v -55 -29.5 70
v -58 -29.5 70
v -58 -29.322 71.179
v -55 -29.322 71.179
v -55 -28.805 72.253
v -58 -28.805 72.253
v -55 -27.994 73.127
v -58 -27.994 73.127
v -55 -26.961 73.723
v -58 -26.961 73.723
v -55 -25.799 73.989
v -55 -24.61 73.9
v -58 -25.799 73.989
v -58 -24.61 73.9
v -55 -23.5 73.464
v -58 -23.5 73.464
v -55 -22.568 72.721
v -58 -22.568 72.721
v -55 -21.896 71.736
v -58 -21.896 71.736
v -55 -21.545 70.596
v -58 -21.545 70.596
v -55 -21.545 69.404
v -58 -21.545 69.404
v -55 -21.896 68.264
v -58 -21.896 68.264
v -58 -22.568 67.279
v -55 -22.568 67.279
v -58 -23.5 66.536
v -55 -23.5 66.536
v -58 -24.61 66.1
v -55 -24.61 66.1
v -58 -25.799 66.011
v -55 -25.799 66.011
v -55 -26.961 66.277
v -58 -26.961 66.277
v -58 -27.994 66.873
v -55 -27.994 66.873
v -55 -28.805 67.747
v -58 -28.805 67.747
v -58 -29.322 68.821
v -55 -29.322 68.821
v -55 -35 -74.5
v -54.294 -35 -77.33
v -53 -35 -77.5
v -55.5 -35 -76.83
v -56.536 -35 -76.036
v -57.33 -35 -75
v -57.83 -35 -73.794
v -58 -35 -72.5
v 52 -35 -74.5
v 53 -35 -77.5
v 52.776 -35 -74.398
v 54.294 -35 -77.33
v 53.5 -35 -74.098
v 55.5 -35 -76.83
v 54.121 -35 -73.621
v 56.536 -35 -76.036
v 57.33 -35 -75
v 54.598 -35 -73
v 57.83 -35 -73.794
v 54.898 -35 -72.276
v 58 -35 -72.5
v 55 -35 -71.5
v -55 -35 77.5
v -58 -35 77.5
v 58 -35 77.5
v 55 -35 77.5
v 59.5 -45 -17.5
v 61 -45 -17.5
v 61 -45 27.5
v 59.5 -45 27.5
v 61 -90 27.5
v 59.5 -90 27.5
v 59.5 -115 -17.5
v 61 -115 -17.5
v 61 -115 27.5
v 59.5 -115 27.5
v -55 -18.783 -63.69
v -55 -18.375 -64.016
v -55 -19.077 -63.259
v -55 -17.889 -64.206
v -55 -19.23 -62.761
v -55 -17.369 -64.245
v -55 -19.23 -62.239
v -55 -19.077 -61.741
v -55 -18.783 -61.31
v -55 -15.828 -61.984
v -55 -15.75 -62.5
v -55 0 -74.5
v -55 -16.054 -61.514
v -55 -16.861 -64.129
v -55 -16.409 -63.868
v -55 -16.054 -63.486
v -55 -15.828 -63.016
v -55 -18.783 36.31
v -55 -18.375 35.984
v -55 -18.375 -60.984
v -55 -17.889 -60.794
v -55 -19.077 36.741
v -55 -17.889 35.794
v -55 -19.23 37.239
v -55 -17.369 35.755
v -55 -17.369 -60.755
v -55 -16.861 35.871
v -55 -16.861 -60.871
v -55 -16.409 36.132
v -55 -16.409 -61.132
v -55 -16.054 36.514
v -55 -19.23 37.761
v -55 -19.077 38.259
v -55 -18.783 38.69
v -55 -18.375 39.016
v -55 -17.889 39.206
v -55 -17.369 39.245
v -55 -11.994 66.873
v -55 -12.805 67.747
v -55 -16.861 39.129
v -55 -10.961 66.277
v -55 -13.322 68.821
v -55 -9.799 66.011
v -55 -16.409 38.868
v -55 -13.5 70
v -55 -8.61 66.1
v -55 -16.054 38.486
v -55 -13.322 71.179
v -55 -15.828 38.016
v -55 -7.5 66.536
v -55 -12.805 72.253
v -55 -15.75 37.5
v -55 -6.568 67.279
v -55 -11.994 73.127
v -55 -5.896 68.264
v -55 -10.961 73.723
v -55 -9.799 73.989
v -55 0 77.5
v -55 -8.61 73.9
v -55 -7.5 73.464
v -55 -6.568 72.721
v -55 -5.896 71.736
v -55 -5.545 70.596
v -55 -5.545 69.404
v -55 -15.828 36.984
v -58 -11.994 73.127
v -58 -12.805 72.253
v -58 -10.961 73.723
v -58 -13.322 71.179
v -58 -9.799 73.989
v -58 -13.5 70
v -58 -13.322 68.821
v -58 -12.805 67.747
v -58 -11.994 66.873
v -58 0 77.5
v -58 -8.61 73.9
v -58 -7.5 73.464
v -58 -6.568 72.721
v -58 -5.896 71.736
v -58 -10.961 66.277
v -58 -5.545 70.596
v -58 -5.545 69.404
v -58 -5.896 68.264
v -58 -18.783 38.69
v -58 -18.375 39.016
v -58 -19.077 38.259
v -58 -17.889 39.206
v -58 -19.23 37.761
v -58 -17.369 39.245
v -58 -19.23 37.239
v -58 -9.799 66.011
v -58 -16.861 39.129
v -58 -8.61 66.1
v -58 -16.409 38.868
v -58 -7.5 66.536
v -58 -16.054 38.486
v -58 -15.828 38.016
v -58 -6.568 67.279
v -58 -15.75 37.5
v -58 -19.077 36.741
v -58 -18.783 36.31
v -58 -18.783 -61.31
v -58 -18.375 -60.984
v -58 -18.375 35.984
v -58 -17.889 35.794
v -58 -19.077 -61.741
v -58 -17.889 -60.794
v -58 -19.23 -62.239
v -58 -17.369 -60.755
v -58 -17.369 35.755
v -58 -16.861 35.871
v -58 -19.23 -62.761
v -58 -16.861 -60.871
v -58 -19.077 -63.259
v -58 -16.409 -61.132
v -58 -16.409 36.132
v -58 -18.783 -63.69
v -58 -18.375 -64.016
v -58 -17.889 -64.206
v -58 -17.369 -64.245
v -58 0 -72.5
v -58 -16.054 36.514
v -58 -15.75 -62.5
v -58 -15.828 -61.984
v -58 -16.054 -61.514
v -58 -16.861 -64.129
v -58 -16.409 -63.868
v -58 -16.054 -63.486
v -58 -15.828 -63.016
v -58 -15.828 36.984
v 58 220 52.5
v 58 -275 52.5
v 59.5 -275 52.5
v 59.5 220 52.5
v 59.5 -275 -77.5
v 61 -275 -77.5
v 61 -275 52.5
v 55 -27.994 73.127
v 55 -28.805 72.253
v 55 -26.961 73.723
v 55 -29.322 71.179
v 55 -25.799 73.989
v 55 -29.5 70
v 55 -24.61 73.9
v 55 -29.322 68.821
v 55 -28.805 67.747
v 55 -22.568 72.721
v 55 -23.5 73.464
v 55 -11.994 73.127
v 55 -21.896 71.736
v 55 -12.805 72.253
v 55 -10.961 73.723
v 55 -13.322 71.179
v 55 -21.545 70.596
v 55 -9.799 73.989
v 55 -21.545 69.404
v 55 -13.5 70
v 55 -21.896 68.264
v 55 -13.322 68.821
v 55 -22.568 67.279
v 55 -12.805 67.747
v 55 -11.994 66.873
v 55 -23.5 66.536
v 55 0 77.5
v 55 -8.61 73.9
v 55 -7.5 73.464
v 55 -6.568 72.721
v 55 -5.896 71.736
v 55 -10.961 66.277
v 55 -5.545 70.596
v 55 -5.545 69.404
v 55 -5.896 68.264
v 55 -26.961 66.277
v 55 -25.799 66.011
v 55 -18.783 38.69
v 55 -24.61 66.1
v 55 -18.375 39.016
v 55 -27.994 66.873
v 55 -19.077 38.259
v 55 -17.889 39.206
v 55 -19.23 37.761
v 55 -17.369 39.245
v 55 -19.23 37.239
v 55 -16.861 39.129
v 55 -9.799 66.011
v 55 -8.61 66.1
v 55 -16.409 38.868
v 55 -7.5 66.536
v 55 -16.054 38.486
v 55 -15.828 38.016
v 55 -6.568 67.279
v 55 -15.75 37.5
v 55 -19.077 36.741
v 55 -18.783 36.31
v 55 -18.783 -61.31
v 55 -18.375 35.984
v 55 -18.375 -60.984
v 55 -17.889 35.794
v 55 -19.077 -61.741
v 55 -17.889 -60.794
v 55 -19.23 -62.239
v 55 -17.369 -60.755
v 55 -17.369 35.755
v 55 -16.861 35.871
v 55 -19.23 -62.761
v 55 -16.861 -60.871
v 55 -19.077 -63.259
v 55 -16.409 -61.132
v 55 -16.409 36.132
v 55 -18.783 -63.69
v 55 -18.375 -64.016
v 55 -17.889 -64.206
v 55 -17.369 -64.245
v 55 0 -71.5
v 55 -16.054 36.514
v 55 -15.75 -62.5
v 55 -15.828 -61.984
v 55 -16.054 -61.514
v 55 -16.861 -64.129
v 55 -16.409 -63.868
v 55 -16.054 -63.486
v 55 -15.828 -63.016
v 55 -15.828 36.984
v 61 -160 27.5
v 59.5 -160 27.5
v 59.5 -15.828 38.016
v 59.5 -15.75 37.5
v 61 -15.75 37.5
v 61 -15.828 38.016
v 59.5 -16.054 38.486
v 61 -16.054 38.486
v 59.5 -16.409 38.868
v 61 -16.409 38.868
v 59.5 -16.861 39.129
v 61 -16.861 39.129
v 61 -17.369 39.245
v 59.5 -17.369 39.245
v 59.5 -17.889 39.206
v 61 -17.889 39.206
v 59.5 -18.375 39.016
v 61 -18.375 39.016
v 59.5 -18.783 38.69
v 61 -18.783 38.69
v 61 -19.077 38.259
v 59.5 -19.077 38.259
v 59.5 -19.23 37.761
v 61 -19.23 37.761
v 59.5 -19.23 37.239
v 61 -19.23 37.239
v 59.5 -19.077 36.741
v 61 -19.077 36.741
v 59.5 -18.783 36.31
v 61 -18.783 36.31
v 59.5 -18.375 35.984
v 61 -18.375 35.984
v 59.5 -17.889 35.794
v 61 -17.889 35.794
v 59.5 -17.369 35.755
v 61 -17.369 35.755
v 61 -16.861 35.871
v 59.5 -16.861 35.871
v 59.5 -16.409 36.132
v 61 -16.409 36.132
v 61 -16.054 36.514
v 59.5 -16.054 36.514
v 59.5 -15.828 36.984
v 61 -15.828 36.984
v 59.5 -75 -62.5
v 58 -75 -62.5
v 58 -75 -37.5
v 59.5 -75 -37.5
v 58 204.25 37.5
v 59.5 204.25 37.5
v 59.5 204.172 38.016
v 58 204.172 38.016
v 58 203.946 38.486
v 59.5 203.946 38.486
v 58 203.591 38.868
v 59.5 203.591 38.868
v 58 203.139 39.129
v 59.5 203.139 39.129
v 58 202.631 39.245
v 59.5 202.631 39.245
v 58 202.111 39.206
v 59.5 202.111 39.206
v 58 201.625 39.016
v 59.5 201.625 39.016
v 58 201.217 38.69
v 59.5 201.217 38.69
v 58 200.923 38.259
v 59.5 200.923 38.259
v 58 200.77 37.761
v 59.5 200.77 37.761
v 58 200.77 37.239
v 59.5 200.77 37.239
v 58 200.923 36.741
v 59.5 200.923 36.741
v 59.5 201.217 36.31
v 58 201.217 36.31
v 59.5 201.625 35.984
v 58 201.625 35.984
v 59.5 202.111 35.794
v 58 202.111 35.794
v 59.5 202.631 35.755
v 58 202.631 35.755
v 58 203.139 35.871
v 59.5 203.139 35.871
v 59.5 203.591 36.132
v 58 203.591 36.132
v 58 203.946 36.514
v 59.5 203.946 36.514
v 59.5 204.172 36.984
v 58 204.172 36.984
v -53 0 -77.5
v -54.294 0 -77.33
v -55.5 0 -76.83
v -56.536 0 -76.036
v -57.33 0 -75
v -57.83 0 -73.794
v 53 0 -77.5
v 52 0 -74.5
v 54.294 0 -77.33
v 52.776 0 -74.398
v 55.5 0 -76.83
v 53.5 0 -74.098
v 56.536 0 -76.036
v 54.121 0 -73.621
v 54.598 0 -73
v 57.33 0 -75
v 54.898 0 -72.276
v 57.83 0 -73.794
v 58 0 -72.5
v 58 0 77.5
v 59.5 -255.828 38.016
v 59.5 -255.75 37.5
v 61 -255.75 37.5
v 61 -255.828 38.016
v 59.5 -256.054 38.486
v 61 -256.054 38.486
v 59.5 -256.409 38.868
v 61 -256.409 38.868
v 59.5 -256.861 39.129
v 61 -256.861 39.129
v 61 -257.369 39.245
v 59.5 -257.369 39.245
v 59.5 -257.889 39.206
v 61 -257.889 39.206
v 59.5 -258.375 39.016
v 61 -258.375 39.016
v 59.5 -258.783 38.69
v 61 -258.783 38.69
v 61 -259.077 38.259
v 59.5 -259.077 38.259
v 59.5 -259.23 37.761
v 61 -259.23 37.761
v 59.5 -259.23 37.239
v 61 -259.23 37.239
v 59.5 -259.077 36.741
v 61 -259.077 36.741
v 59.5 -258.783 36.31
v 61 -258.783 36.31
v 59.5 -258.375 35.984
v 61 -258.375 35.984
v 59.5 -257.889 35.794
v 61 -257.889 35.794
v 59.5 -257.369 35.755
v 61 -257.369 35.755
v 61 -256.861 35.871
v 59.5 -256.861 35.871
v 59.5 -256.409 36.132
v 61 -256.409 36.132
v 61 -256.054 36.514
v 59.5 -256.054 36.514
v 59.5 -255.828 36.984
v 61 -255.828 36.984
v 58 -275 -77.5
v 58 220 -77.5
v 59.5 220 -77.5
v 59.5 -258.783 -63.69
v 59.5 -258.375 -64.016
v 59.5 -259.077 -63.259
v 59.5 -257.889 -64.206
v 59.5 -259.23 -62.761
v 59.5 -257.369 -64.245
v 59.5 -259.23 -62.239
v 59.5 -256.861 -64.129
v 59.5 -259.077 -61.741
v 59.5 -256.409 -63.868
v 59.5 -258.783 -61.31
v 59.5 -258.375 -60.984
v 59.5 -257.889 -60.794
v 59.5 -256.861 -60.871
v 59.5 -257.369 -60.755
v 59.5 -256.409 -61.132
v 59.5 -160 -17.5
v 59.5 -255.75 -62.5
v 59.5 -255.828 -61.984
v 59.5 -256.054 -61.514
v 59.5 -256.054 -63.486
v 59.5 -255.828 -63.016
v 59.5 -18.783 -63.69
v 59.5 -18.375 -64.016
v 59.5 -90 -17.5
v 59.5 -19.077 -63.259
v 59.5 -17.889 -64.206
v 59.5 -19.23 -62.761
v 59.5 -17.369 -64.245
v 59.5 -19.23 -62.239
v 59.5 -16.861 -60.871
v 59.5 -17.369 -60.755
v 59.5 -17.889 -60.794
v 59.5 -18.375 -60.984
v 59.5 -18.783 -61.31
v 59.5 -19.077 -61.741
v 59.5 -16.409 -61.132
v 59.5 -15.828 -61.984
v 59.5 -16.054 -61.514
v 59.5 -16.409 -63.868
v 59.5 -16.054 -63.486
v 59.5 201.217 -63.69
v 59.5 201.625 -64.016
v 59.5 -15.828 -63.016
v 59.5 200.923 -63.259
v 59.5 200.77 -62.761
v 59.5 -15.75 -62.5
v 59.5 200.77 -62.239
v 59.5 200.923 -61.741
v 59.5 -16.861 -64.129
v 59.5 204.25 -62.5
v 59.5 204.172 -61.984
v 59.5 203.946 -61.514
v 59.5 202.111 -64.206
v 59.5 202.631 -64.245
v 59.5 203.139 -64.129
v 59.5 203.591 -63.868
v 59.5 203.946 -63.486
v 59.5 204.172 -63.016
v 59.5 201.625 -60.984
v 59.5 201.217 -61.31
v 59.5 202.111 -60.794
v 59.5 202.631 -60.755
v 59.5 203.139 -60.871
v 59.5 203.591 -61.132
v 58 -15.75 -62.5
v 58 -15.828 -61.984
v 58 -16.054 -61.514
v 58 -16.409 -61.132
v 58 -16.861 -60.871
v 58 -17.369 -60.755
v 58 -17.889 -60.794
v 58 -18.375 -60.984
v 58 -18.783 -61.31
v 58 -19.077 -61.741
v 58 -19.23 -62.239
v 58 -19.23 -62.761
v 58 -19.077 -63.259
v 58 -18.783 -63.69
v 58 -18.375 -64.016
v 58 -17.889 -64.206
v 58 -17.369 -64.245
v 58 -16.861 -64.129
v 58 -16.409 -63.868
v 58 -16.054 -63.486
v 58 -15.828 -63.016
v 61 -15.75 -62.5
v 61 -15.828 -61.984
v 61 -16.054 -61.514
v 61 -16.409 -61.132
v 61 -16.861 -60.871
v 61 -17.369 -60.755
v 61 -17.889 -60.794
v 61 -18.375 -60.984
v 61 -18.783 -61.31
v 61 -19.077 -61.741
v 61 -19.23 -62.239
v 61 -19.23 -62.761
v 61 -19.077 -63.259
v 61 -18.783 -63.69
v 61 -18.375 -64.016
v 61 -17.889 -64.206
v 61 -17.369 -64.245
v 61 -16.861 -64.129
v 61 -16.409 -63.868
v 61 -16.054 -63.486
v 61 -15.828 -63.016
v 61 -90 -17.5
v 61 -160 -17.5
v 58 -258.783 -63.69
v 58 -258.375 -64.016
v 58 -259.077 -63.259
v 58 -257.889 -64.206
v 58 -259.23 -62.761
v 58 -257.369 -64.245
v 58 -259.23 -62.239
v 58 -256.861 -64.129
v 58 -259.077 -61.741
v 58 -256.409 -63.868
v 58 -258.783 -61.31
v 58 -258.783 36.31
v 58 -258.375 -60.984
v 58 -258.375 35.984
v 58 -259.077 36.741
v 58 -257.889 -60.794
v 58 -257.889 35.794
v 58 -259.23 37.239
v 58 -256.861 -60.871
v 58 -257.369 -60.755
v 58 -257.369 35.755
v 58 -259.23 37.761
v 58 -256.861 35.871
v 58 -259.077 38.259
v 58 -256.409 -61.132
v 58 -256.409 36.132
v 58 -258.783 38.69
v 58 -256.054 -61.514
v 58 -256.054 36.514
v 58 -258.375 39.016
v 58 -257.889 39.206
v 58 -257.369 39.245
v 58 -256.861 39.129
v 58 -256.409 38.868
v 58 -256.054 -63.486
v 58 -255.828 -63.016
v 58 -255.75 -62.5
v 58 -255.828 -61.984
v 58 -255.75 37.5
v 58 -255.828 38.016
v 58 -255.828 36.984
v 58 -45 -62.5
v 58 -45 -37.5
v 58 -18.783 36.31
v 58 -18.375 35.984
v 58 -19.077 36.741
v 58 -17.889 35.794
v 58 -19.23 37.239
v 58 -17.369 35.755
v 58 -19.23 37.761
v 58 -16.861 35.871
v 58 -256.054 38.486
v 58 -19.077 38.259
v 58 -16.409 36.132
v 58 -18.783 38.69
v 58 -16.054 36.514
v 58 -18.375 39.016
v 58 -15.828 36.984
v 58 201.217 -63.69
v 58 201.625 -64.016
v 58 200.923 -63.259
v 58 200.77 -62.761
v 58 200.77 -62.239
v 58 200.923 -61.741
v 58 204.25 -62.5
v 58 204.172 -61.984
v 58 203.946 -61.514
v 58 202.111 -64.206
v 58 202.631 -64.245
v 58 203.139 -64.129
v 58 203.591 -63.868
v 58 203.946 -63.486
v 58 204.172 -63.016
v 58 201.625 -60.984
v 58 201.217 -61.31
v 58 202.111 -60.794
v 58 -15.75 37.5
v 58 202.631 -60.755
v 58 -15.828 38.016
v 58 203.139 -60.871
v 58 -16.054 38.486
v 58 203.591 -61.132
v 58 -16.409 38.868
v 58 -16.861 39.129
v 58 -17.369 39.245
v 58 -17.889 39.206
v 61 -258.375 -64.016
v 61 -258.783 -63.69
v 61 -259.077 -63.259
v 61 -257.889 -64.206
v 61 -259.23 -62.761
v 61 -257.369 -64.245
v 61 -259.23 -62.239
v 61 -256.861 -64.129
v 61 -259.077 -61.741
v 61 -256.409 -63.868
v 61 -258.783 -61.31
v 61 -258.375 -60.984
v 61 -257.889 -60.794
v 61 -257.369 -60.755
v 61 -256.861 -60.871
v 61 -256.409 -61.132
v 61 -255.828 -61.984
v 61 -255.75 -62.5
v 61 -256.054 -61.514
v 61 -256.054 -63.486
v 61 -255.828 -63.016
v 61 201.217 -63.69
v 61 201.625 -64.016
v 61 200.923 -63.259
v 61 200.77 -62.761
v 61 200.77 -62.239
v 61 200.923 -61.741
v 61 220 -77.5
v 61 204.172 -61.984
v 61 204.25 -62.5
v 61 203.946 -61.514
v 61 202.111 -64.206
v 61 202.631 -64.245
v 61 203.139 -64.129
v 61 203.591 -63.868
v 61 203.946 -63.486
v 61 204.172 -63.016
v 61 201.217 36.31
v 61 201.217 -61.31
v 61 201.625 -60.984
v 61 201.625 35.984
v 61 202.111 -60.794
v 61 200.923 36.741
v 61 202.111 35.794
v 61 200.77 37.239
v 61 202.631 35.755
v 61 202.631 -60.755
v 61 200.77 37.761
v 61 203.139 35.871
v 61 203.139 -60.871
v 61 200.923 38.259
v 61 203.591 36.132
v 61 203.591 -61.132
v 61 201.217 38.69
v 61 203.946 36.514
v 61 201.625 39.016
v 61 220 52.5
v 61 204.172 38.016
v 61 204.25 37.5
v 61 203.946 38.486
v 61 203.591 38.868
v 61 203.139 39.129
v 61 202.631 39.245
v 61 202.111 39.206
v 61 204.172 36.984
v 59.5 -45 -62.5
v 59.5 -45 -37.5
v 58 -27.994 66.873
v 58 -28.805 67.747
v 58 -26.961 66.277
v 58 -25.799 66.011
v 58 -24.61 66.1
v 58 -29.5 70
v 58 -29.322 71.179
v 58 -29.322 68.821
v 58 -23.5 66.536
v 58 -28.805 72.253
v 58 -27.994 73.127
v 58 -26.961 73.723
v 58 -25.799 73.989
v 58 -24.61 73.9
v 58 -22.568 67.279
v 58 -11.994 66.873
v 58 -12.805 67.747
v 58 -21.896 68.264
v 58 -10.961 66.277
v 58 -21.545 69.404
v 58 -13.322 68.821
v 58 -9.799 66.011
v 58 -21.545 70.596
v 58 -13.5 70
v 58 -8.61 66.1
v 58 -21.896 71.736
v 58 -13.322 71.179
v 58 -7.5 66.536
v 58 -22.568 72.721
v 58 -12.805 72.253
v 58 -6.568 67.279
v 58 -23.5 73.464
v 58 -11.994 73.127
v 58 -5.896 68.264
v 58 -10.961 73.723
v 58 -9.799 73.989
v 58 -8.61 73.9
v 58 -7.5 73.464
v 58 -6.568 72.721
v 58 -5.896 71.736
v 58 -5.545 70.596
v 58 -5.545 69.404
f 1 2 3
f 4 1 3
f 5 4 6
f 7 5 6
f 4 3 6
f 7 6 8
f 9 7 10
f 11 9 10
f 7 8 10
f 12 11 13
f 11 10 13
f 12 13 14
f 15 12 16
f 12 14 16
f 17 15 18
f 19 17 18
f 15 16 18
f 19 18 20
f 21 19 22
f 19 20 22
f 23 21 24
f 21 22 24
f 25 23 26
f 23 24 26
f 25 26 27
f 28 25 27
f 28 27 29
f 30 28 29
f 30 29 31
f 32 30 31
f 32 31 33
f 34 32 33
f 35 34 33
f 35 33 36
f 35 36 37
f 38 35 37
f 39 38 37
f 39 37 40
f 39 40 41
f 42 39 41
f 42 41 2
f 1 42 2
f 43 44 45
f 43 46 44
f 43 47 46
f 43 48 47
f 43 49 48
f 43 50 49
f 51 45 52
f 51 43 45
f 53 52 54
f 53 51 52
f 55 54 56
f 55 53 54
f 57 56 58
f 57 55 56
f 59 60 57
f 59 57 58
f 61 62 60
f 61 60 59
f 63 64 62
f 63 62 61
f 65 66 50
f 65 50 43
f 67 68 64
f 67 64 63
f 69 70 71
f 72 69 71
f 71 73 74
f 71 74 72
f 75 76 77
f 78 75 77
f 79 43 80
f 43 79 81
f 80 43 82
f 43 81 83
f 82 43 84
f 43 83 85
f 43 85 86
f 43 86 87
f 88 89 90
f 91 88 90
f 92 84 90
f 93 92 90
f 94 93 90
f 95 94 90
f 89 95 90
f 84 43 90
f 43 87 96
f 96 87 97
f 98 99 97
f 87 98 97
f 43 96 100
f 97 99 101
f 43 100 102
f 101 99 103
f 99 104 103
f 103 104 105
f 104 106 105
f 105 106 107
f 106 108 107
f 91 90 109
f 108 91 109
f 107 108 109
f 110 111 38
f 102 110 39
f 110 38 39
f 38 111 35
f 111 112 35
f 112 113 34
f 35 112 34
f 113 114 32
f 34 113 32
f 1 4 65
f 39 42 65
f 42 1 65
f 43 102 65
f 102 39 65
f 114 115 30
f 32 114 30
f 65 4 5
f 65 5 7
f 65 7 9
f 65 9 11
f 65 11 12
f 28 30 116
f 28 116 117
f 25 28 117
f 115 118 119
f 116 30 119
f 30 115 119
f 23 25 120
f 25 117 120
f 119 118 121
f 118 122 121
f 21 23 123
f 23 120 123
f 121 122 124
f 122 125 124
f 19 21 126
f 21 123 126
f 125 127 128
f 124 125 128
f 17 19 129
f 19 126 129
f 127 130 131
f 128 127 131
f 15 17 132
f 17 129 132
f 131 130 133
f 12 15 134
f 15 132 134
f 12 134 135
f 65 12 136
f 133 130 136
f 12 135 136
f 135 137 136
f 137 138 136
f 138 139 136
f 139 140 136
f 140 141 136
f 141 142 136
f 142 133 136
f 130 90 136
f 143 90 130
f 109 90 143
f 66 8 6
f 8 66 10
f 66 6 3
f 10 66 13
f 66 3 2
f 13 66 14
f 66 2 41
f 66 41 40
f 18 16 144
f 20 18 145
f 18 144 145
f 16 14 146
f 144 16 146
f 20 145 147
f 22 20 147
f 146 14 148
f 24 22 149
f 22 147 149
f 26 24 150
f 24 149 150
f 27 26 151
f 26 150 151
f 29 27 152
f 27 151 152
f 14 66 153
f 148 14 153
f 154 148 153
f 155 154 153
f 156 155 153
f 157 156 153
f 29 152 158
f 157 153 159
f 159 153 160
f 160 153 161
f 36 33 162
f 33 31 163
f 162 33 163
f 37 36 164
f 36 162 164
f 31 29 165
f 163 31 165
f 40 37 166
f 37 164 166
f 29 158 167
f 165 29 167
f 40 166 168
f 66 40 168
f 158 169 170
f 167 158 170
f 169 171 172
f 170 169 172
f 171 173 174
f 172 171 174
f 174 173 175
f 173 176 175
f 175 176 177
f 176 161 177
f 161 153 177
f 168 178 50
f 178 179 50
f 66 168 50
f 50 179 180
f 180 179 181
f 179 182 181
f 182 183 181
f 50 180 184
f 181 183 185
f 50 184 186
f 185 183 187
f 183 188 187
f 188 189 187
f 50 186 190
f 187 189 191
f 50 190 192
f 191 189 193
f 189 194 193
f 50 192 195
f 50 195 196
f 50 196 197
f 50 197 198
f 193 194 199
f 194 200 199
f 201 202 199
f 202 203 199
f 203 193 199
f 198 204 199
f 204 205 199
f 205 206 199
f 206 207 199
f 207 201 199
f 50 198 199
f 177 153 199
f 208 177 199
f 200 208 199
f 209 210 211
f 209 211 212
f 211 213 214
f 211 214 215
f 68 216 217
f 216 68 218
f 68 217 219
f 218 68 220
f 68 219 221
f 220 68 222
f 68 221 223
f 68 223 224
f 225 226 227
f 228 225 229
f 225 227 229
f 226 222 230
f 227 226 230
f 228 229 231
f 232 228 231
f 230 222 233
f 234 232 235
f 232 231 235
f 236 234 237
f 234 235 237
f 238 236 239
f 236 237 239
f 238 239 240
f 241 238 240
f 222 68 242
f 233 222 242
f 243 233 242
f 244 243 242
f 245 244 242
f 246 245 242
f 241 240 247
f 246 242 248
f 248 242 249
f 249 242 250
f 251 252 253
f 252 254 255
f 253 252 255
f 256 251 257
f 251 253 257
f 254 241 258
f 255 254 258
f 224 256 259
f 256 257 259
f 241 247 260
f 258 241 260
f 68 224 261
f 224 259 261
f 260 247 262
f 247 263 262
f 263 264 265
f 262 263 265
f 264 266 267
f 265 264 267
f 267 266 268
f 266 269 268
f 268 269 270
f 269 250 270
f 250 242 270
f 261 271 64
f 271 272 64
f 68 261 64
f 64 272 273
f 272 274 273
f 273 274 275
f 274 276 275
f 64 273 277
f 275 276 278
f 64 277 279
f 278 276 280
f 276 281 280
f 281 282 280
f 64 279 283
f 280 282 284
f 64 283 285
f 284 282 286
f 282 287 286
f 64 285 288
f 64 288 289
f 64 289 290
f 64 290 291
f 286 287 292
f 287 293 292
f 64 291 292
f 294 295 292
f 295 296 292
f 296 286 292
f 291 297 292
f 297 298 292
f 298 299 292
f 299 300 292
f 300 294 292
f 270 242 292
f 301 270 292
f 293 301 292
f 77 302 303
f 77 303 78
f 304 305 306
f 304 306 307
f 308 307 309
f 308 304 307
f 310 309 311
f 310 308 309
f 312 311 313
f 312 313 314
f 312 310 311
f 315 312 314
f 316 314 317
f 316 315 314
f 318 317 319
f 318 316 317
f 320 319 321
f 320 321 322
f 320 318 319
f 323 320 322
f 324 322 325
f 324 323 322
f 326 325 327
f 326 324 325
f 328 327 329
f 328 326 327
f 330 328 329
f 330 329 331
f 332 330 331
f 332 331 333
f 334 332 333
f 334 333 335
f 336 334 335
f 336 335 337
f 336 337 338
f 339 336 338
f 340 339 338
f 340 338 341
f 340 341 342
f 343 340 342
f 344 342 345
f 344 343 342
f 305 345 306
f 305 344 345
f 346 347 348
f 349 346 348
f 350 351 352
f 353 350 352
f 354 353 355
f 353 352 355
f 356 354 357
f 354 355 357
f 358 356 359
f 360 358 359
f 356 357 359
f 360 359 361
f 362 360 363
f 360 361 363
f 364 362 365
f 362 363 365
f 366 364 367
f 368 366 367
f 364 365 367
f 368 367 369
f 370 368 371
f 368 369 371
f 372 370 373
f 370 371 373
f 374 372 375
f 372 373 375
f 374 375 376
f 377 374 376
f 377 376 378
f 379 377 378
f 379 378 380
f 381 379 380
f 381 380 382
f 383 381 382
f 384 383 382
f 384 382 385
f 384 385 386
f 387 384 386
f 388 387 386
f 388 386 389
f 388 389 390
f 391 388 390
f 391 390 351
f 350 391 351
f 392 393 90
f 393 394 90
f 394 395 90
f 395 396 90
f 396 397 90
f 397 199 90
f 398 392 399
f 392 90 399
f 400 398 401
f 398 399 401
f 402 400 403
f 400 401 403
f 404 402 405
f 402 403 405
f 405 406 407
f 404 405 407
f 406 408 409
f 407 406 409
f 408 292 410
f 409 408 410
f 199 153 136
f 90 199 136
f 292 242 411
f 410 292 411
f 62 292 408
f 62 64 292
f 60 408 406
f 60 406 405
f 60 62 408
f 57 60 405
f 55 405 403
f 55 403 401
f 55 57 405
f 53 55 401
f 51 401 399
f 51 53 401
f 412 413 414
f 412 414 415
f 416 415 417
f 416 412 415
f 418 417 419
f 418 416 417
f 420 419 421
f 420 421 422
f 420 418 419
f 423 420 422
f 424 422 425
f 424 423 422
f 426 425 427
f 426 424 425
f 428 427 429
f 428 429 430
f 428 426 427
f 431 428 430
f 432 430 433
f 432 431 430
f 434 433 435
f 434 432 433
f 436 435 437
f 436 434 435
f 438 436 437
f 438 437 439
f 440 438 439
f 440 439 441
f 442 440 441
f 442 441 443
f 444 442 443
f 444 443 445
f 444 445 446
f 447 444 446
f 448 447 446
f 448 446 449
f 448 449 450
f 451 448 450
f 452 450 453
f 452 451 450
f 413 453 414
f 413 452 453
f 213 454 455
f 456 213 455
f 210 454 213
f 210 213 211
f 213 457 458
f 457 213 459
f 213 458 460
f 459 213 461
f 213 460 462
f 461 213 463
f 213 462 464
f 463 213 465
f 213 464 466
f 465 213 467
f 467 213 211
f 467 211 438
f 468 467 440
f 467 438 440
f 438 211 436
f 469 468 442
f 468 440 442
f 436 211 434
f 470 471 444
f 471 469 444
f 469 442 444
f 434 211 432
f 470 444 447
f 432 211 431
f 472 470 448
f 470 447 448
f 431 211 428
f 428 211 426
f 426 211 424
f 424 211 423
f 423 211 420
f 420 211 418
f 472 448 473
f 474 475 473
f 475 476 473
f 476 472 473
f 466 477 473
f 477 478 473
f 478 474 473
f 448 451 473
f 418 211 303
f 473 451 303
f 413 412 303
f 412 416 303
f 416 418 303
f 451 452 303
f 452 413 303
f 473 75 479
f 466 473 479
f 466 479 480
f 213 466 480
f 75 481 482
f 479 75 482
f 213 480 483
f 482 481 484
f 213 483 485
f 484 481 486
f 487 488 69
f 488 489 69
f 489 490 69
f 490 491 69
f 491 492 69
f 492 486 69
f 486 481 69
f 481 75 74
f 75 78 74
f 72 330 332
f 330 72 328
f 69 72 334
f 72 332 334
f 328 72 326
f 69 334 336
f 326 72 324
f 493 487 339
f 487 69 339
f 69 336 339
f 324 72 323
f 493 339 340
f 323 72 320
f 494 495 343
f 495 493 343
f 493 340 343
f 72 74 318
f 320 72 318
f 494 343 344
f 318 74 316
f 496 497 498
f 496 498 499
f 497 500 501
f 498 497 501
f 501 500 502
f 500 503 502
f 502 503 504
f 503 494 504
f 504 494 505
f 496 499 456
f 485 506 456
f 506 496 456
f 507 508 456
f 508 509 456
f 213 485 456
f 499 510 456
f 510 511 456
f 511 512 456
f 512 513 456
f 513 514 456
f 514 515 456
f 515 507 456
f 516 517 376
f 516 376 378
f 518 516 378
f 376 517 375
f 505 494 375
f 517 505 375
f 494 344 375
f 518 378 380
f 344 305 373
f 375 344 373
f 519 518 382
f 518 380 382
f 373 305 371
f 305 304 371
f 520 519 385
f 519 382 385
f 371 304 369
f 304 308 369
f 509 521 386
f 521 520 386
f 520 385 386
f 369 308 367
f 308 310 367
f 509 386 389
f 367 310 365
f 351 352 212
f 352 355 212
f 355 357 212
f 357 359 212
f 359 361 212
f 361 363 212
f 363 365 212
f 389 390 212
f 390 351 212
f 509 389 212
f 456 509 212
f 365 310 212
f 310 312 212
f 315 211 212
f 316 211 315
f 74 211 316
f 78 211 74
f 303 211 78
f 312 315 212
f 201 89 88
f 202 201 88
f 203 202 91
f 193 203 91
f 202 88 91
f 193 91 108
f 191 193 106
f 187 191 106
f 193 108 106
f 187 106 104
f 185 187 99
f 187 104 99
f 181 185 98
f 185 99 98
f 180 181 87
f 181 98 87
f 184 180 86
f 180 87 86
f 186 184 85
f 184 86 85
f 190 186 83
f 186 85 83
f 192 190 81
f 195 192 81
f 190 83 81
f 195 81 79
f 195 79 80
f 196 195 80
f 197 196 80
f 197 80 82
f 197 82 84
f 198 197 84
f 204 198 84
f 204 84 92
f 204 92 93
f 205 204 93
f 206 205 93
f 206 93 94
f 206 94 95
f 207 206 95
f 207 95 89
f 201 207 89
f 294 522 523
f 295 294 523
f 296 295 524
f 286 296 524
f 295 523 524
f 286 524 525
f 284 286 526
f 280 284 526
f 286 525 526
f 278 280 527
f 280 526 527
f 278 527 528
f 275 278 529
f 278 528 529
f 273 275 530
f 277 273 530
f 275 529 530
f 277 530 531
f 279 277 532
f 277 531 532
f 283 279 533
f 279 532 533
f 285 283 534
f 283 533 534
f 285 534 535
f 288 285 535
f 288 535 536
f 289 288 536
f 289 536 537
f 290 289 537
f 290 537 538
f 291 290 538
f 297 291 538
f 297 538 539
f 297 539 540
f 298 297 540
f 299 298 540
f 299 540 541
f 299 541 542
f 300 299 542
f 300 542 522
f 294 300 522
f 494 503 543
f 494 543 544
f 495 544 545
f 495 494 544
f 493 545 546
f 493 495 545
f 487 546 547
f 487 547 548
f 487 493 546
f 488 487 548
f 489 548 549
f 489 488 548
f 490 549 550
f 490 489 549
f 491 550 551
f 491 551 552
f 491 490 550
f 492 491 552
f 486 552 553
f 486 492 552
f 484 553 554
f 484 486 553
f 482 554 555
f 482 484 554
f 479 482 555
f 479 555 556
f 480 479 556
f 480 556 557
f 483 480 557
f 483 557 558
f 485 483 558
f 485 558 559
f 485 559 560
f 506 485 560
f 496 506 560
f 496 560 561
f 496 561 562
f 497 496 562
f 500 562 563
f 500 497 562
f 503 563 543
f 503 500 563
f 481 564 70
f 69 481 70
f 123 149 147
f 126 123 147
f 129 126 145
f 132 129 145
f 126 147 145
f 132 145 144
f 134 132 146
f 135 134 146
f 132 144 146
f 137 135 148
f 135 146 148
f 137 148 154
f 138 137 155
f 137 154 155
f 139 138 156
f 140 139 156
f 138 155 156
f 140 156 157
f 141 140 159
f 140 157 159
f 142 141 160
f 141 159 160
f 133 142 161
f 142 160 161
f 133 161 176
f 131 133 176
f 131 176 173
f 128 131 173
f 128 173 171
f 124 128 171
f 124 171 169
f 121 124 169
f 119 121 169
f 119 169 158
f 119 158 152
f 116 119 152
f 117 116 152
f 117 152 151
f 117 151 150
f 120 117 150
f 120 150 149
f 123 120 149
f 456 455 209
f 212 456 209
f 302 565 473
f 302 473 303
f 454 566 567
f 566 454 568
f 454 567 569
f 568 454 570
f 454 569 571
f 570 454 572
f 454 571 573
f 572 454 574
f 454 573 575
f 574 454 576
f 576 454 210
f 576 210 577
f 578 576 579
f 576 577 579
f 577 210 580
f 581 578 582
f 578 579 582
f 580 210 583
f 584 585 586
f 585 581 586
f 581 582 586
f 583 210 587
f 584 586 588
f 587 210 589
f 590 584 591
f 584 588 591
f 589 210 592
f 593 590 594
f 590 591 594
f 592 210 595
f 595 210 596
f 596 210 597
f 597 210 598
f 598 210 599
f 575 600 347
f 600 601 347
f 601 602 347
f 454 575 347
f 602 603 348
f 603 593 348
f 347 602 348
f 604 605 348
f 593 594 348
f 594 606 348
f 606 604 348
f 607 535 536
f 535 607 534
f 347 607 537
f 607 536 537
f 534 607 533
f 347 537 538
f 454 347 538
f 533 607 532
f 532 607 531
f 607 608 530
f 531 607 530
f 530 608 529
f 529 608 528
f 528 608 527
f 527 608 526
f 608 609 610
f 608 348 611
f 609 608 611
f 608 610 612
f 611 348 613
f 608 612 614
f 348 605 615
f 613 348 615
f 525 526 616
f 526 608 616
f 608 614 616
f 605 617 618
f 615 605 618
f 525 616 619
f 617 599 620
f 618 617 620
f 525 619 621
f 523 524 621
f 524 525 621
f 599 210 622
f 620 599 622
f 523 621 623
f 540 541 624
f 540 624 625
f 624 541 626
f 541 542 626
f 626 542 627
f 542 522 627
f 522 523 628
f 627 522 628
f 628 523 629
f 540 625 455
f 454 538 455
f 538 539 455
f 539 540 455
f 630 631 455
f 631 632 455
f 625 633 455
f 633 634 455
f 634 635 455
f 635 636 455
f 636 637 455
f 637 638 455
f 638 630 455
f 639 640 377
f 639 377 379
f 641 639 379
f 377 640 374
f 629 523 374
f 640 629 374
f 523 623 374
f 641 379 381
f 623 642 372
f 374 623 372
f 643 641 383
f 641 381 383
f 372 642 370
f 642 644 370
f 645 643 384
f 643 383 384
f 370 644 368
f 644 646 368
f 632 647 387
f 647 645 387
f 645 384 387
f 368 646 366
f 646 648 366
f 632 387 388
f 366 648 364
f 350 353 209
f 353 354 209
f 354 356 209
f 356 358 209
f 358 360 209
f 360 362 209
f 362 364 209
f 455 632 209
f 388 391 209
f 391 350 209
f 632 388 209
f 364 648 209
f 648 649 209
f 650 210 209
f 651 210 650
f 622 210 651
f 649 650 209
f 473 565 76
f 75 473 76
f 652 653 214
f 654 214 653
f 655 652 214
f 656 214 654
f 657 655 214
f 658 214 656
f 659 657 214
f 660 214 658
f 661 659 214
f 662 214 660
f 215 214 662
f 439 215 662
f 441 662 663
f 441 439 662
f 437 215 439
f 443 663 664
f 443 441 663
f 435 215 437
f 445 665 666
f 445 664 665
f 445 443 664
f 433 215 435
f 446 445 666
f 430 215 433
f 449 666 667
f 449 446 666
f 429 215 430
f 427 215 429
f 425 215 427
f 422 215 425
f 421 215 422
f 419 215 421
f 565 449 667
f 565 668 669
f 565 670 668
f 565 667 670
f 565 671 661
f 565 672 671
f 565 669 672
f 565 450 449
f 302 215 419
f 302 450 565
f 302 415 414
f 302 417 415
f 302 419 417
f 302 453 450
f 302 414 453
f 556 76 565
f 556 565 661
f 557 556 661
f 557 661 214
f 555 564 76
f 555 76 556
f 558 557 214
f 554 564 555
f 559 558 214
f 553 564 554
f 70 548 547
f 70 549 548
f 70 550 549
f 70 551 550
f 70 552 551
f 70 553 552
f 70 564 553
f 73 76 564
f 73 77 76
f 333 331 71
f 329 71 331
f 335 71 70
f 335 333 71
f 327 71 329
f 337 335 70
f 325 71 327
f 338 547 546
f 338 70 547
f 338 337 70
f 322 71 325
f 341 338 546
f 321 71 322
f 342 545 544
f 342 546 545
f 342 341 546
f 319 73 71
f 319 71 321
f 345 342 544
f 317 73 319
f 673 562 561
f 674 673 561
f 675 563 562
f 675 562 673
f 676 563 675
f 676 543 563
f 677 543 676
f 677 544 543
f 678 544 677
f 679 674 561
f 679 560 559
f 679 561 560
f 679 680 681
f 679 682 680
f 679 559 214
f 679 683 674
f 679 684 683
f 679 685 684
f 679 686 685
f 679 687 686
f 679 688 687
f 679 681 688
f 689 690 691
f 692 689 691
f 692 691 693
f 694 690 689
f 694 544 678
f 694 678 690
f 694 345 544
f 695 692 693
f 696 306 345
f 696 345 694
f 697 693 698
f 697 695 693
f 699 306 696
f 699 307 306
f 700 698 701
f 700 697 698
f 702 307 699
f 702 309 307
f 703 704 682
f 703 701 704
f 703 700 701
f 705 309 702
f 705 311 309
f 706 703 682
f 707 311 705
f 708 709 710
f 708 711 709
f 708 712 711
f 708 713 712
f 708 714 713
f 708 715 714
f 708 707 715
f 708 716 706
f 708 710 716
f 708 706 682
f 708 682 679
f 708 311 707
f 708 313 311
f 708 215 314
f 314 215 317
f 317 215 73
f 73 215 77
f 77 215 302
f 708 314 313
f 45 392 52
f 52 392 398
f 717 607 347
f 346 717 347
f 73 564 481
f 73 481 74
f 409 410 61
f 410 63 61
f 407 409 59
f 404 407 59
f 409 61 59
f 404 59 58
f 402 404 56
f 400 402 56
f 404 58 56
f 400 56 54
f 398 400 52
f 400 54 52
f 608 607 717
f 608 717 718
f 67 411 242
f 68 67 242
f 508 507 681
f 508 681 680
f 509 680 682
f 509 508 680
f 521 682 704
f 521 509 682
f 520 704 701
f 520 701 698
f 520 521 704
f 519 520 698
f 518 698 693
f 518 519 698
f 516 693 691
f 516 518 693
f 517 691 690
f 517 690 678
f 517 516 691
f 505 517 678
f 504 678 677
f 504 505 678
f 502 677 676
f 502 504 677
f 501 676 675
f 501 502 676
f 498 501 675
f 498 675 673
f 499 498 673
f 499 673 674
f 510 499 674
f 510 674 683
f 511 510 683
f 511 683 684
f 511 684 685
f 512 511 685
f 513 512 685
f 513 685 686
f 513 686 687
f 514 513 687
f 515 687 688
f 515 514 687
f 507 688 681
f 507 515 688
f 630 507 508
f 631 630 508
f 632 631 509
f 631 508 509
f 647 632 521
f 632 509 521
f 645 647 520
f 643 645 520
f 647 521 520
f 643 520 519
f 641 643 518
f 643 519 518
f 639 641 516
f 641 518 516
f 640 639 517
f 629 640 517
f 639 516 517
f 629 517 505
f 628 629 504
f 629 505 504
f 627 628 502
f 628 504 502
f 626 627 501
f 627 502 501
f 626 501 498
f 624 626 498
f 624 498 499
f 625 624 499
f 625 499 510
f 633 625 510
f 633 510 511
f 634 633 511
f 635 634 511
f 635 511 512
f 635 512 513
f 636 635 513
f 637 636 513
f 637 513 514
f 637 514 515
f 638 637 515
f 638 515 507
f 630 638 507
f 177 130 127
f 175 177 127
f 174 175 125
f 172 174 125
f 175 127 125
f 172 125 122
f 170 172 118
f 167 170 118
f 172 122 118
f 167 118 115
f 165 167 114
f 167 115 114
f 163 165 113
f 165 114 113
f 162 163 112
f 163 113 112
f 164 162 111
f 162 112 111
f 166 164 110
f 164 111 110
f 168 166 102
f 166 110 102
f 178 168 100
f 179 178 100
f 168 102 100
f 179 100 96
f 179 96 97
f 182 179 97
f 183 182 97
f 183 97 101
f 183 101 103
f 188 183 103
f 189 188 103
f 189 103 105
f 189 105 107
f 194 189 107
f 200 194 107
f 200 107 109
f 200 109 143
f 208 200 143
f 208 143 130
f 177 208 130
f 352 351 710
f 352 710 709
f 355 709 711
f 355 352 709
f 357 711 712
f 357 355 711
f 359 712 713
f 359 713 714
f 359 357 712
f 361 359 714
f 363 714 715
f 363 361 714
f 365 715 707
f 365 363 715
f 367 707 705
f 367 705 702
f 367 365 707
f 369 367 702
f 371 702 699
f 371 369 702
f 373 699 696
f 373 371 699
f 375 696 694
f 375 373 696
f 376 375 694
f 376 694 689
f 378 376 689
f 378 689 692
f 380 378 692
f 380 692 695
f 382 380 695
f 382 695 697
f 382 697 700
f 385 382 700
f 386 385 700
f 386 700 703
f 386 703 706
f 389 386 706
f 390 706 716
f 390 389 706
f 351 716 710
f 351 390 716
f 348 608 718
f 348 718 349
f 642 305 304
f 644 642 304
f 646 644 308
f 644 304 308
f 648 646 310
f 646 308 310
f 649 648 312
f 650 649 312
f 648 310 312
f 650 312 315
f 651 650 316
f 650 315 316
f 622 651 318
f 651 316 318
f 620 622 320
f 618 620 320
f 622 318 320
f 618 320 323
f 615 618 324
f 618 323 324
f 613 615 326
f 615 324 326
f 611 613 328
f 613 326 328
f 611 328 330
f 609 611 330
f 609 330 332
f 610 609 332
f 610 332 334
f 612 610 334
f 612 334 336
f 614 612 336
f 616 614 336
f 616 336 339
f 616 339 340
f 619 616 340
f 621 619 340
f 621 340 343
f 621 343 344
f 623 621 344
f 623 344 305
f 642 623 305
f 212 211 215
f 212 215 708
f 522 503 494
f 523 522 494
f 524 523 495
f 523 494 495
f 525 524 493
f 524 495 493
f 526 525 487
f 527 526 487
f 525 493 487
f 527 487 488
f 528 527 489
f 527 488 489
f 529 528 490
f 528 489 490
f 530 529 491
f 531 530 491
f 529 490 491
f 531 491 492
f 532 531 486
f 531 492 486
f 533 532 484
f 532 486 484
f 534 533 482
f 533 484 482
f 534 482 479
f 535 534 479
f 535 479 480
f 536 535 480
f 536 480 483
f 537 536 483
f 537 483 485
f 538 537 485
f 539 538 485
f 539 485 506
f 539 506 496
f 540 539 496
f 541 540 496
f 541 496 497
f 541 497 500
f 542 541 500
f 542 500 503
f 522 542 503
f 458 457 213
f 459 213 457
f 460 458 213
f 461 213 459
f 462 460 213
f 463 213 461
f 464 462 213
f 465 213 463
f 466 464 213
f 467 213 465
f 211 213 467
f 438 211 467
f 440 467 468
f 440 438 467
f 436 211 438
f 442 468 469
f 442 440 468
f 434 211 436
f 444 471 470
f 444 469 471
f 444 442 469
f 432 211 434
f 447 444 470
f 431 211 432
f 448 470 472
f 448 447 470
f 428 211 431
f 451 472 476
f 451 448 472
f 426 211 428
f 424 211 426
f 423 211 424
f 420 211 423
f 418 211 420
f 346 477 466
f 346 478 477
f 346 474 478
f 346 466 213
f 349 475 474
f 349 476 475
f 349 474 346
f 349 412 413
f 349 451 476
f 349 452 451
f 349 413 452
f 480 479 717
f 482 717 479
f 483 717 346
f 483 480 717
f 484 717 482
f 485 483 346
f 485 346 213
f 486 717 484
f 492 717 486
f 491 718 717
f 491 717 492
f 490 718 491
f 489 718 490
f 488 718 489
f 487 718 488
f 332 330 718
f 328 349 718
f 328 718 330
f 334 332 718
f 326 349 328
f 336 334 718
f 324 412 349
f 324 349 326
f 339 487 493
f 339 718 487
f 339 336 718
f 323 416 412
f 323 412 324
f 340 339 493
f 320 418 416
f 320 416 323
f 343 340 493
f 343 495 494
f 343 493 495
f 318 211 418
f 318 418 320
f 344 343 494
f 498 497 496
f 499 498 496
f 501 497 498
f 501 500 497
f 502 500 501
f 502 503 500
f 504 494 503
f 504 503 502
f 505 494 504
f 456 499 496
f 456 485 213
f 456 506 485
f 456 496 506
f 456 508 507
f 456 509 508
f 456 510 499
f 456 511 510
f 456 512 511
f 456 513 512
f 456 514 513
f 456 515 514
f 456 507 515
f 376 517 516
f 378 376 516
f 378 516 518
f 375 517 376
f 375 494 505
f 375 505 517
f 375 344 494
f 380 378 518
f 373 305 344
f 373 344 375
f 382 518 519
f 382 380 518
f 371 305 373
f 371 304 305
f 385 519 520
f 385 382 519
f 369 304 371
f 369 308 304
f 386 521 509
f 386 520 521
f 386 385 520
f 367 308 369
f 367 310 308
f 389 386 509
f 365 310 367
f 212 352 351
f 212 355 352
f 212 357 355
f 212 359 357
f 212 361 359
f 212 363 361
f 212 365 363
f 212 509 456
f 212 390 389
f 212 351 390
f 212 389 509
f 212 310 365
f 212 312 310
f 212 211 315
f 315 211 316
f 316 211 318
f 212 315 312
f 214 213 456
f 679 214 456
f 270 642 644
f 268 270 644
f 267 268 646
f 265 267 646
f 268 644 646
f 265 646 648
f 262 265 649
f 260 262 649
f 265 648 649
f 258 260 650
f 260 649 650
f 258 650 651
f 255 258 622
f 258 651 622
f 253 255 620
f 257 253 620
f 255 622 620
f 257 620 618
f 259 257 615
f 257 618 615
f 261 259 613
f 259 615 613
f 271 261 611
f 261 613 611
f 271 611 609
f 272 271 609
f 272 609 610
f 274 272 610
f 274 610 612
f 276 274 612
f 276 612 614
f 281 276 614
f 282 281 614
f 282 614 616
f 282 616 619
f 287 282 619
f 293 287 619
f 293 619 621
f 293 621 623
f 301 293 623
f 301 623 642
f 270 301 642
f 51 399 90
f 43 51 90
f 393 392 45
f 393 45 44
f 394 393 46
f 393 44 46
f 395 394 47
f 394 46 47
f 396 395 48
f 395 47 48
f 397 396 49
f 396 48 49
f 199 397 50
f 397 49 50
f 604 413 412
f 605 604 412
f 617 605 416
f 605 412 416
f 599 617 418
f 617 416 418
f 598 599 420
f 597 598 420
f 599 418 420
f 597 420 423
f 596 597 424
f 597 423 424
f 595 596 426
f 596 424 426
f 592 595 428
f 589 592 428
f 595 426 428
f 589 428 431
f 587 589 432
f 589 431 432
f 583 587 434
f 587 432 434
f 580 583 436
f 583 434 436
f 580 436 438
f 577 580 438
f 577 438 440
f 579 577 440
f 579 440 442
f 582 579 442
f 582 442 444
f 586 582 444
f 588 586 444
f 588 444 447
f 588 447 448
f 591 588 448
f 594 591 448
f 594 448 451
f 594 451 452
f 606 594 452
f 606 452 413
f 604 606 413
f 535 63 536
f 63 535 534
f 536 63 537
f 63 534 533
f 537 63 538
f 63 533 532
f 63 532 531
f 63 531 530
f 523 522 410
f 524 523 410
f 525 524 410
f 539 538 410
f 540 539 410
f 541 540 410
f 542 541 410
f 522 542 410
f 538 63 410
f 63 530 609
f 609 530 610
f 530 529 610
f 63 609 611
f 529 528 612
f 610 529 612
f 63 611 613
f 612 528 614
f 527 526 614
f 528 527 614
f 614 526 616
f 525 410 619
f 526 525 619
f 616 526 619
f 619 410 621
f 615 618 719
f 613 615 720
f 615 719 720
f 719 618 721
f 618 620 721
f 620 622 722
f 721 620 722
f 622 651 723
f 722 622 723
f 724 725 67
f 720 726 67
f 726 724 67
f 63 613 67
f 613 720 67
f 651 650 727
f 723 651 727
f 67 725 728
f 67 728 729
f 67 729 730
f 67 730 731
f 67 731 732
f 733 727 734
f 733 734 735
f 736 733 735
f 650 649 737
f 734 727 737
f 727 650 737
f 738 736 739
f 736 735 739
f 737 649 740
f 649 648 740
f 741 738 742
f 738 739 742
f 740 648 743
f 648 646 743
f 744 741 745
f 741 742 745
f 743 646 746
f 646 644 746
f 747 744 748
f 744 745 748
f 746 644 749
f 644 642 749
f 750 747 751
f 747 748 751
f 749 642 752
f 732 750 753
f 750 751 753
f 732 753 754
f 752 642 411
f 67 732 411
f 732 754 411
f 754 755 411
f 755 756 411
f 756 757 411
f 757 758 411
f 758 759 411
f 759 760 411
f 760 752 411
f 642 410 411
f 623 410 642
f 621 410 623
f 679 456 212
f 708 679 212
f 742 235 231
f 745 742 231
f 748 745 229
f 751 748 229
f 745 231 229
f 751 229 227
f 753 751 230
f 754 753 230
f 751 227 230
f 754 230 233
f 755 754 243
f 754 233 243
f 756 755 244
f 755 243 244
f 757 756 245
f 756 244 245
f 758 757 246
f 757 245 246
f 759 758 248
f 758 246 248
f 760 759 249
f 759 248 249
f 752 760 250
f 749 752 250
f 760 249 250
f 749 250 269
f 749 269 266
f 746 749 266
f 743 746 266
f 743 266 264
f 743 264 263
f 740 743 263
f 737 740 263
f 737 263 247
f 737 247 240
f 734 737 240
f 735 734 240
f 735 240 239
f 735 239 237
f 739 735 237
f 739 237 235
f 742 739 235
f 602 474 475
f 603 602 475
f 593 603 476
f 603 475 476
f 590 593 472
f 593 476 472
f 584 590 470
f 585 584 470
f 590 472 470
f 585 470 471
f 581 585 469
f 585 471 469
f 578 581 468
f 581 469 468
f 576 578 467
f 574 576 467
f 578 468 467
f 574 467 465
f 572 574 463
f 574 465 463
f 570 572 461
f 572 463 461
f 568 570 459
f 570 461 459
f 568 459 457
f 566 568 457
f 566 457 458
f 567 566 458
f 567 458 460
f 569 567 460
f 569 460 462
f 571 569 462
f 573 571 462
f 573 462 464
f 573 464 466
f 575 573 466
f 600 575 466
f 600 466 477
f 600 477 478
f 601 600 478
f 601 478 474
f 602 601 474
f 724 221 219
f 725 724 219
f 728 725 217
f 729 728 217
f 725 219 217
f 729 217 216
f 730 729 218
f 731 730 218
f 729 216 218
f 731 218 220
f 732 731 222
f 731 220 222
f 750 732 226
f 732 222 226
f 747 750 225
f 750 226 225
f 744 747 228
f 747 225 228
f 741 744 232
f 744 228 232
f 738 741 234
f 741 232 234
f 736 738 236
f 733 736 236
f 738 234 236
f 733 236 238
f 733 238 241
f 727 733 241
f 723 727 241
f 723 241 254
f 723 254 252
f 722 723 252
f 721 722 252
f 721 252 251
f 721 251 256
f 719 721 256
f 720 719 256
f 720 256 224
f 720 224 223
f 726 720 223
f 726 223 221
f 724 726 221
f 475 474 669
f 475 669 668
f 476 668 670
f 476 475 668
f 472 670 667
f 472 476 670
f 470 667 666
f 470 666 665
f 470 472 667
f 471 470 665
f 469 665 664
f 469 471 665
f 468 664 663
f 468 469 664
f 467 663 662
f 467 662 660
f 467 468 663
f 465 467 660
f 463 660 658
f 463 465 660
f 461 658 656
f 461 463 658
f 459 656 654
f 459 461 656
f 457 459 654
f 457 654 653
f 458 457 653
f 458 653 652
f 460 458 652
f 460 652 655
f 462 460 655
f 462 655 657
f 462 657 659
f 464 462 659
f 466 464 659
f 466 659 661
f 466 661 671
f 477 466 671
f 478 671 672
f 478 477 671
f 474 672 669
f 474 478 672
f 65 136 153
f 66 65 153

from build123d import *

# Parameters (mm, degrees)
F1_DEPTH  = 35
F2_R      = 3
F3_R      = 5
F4_R      = 4
F5_DEPTH  = 116.001
F6_W      = 495
F6_H      = 130
F7_DEPTH  = 1.5
F8_R      = 1.75
F9_DEPTH  = 117.501
F10_DEPTH = 1.5
F11_W     = 45
F11_H     = 45
F12_DEPTH = 25
F13_W     = 30
F13_H     = 25
F14_DEPTH = 25


with BuildPart() as f1:
    # F0 (on Front) → F1 (new body)
    with BuildSketch(Plane.XZ):
        Polygon((-58, -77.5), (58, -77.5), (58, 77.5), (55, 77.5), (55, -74.5), (-55, -74.5), (-55, 77.5), (-58, 77.5), align=None)
    extrude(amount=F1_DEPTH)

    # F2
    f2_edges = [f1.edges().sort_by_distance(p)[0] for p in [
        (55, -17.5, -74.5),
    ]]
    fillet(f2_edges, radius=F2_R)

    # F3
    f3_edges = [f1.edges().sort_by_distance(p)[0] for p in [
        (-58, -17.5, -77.5),
        (58, -17.5, -77.5),
    ]]
    fillet(f3_edges, radius=F3_R)

    # F4 (on face) → F5 (cut, through all)
    with BuildSketch(Plane(origin=(-58, 0, 0), x_dir=(0, -1, 0), z_dir=(-1, 0, 0))):
        with Locations((9.5, 70)):
            Circle(F4_R)
        with Locations((25.5, 70)):
            Circle(F4_R)
    extrude(amount=-F5_DEPTH, mode=Mode.SUBTRACT)


with BuildPart() as f7:
    # F6 (on face) → F7 (new body)
    with BuildSketch(Plane.YZ.offset(58)):
        with Locations((-27.5, -12.5)):
            Rectangle(F6_W, F6_H)
    extrude(amount=F7_DEPTH)


with BuildPart() as f9_tool:
    # F8 (on face) → F9 (new body, through all)
    with BuildSketch(Plane.YZ.offset(59.5)):
        with Locations((-17.5, 37.5)):
            Circle(F8_R)
        with Locations((-17.5, -62.5)):
            Circle(F8_R)
        with Locations((202.5, -62.5)):
            Circle(F8_R)
        with Locations((202.5, 37.5)):
            Circle(F8_R)
        with Locations((-257.5, 37.5)):
            Circle(F8_R)
        with Locations((-257.5, -62.5)):
            Circle(F8_R)
    extrude(amount=-F9_DEPTH)


with BuildPart() as f1_1:
    add(f1.part)

    # F9: cut by f9_tool
    add(f9_tool.part, mode=Mode.SUBTRACT)


with BuildPart() as f7_1:
    add(f7.part)

    # F9: cut by f9_tool
    add(f9_tool.part, mode=Mode.SUBTRACT)


with BuildPart() as f10:
    # F10 (new): a face of the model
    f10_faces = [f7_1.part.faces().sort_by_distance(p)[0] for p in [
        (59.5, -27.5029929343, -12.5),
    ]]
    extrude(f10_faces, amount=F10_DEPTH)

    # F11 (on face) → F12 (cut)
    with BuildSketch(Plane.YZ.offset(61)):
        with Locations((-67.5, 5)):
            Rectangle(F11_W, F11_H)
        with Locations((-137.5, 5)):
            Rectangle(F11_W, F11_H)
    extrude(amount=-F12_DEPTH, mode=Mode.SUBTRACT)


with BuildPart() as f7_2:
    add(f7_1.part)

    # F13 (on face) → F14 (cut)
    with BuildSketch(Plane(origin=(58, 0, 0), x_dir=(0, -1, 0), z_dir=(-1, 0, 0))):
        with Locations((60, -50)):
            Rectangle(F13_W, F13_H)
    extrude(amount=-F14_DEPTH, mode=Mode.SUBTRACT)


solid = Compound([f1_1.part, f10.part, f7_2.part])
